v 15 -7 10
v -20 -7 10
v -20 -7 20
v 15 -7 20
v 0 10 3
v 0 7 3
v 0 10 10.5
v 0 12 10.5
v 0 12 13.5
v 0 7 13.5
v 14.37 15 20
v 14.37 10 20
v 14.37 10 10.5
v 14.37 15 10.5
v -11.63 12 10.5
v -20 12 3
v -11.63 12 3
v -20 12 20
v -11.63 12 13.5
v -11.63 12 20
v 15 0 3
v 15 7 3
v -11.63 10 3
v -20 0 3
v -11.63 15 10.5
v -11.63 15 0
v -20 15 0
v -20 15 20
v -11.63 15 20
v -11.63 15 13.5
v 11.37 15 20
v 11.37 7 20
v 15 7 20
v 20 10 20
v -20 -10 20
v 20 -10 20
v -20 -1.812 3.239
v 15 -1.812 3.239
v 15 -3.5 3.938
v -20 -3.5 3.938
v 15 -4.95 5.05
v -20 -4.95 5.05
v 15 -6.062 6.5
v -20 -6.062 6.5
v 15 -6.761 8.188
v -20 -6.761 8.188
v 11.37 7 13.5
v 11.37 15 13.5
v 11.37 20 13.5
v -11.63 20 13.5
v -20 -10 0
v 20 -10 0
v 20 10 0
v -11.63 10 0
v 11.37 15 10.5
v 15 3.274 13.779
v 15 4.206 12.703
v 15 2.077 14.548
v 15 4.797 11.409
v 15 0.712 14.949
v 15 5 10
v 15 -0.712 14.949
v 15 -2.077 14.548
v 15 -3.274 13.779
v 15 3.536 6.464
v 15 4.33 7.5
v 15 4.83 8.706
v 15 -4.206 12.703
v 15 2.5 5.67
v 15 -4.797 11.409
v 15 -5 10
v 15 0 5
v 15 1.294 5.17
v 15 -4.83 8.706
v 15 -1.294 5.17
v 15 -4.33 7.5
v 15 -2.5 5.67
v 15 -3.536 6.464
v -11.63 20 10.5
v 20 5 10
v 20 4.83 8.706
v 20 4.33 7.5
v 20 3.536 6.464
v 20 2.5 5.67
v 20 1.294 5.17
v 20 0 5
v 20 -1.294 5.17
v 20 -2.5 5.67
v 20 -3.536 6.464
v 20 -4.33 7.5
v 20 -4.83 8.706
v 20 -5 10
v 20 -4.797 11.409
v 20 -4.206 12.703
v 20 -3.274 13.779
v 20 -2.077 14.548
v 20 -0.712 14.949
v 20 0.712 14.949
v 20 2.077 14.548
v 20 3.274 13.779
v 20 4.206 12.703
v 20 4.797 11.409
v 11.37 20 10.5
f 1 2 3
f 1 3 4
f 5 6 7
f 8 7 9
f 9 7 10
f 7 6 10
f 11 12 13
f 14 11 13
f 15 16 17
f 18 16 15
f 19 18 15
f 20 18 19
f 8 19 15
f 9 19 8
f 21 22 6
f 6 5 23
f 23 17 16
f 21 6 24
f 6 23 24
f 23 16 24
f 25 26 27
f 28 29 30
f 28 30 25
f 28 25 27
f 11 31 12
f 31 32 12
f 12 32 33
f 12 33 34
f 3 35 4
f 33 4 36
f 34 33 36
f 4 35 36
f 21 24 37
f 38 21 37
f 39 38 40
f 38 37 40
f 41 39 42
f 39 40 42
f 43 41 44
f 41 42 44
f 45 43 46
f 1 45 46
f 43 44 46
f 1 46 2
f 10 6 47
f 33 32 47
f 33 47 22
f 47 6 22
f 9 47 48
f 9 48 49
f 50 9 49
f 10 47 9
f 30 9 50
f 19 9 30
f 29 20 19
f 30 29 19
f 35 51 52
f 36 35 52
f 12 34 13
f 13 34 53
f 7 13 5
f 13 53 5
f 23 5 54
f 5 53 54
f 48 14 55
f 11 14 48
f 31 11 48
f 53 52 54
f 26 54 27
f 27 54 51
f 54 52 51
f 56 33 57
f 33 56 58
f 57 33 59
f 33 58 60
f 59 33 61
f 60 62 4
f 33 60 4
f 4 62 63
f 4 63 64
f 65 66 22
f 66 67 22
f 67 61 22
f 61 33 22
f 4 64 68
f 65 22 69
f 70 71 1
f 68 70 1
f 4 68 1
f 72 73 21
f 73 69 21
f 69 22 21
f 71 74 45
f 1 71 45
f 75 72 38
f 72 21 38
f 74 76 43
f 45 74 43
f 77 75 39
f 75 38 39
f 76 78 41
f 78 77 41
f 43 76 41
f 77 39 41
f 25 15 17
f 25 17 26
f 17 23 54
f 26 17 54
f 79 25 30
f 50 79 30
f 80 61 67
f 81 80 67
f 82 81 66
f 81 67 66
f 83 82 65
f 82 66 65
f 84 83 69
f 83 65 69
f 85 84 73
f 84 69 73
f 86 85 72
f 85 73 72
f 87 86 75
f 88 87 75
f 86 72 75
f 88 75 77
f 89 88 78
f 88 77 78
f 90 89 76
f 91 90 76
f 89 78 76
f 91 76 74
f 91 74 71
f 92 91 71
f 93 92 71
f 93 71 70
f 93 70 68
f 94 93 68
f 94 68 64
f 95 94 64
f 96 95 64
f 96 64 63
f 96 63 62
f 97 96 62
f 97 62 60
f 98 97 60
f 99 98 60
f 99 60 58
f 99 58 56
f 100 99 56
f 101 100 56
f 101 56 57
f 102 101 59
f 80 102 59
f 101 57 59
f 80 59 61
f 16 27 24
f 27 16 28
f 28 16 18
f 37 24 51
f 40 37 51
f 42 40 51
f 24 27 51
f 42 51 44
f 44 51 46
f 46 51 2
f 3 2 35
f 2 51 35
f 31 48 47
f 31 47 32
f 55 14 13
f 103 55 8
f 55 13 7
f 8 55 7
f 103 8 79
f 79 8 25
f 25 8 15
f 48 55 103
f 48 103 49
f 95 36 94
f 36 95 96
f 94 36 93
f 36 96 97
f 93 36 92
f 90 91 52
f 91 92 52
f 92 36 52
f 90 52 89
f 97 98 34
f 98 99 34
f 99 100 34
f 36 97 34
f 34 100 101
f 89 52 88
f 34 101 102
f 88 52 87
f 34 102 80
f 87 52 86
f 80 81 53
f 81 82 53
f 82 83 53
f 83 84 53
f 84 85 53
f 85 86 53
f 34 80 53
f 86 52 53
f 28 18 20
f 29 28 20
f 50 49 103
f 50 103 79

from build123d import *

# Parameters (mm, degrees)
F0_W      = 40
F0_H      = 20
F1_DEPTH  = 10
F3_W      = 35
F3_H      = 3
F4_DEPTH  = 10
F5_W      = 23
F5_H      = 3
F6_DEPTH  = 6.5
F7_W      = 23
F7_H      = 3
F8_DEPTH  = 5
F9_DEPTH  = 10
F10_DEPTH = 35
F11_DEPTH = 40
F12_DEPTH = 35
F13_DEPTH = 40
F14_DEPTH = 35
F15_W     = 20
F15_H     = 17
F16_DEPTH = 5


with BuildPart() as f1:
    # F0 (on Top) → F1 (new body)
    with BuildSketch(Plane.XY):
        Rectangle(F0_W, F0_H)
    extrude(amount=F1_DEPTH)

    # F3 (on face) → F4 (join)
    with BuildSketch(Plane.XY.offset(10)):
        Polygon((20, -10), (20, 10), (15, 10), (15, 7), (15, -7), (15, -10), align=None)
        with Locations((-2.5, 8.5)):
            Rectangle(F3_W, F3_H)
        with Locations((-2.5, -8.5)):
            Rectangle(F3_W, F3_H)
    extrude(amount=F4_DEPTH)

    # F5 (on face) → F6 (cut)
    with BuildSketch(Plane.XY.offset(20)):
        with Locations((-0.1296941414, 8.5)):
            Rectangle(F5_W, F5_H)
    extrude(amount=-F6_DEPTH, mode=Mode.SUBTRACT)

    # F7 (on face) → F8 (join)
    with BuildSketch(Plane(origin=(0, 10, 0), x_dir=(-1, 0, 0), z_dir=(0, 1, 0))):
        with Locations((0.1296941414, 12)):
            Rectangle(F7_W, F7_H)
        Polygon((-11.3703058586, 10.5), (-11.3703058586, 13.5), (-11.3703058586, 20), (-14.3703058586, 20), (-14.3703058586, 10.5), align=None)
        Polygon((11.6296941414, 20), (11.6296941414, 13.5), (11.6296941414, 10.5), (11.6296941414, 0), (20, 0), (20, 20), align=None)
    extrude(amount=F8_DEPTH)

    # F7 (on face) → F9 (join)
    with BuildSketch(Plane(origin=(0, 10, 0), x_dir=(-1, 0, 0), z_dir=(0, 1, 0))):
        with Locations((0.1296941414, 12)):
            Rectangle(F7_W, F7_H)
    extrude(amount=F9_DEPTH)

    # F2 (on face) → F10 (cut)
    with BuildSketch(Plane(origin=(-20, 0, 0), x_dir=(0, -1, 0), z_dir=(-1, 0, 0))):
        with BuildLine():
            Line((-5, 10), (-7, 10))
            ThreePointArc((-7, 10), (-4.9497474683, 5.0502525317), (0, 3))
            Line((0, 3), (0, 5))
            ThreePointArc((0, 5), (-3.5355339059, 6.4644660941), (-5, 10))
        make_face()
        with BuildLine():
            ThreePointArc((0, 5), (3.5355339059, 6.4644660941), (5, 10))
            Line((5, 10), (0, 10))
            Line((0, 10), (0, 5))
        make_face()
    extrude(amount=-F10_DEPTH, mode=Mode.SUBTRACT)

    # F2 (on face) → F11 (cut)
    with BuildSketch(Plane(origin=(-20, 0, 0), x_dir=(0, -1, 0), z_dir=(-1, 0, 0))):
        with BuildLine():
            Line((0, 10), (5, 10))
            ThreePointArc((5, 10), (0, 15), (-5, 10))
            Line((-5, 10), (0, 10))
        make_face()
        with BuildLine():
            ThreePointArc((0, 5), (3.5355339059, 6.4644660941), (5, 10))
            Line((5, 10), (0, 10))
            Line((0, 10), (0, 5))
        make_face()
        with BuildLine():
            Line((0, 10), (-5, 10))
            ThreePointArc((-5, 10), (-3.5355339059, 6.4644660941), (0, 5))
            Line((0, 5), (0, 10))
        make_face()
    extrude(amount=-F11_DEPTH, mode=Mode.SUBTRACT)

    # F2 (on face) → F12 (cut)
    with BuildSketch(Plane(origin=(-20, 0, 0), x_dir=(0, -1, 0), z_dir=(-1, 0, 0))):
        with BuildLine():
            Line((0, 10), (-5, 10))
            ThreePointArc((-5, 10), (-3.5355339059, 6.4644660941), (0, 5))
            Line((0, 5), (0, 10))
        make_face()
        with BuildLine():
            Line((-5, 10), (-7, 10))
            ThreePointArc((-7, 10), (-4.9497474683, 5.0502525317), (0, 3))
            Line((0, 3), (0, 5))
            ThreePointArc((0, 5), (-3.5355339059, 6.4644660941), (-5, 10))
        make_face()
        with BuildLine():
            ThreePointArc((0, 3), (-4.9497474683, 5.0502525317), (-7, 10))
            Line((-7, 10), (-7, 3))
            Line((-7, 3), (0, 3))
        make_face()
    extrude(amount=-F12_DEPTH, mode=Mode.SUBTRACT)

    # F2 (on face) → F13 (cut)
    with BuildSketch(Plane(origin=(-20, 0, 0), x_dir=(0, -1, 0), z_dir=(-1, 0, 0))):
        with BuildLine():
            Line((0, 10), (-5, 10))
            ThreePointArc((-5, 10), (-3.5355339059, 6.4644660941), (0, 5))
            Line((0, 5), (0, 10))
        make_face()
    extrude(amount=-F13_DEPTH, mode=Mode.SUBTRACT)

    # F2 (on face) → F14 (cut)
    with BuildSketch(Plane(origin=(-20, 0, 0), x_dir=(0, -1, 0), z_dir=(-1, 0, 0))):
        with BuildLine():
            ThreePointArc((0, 3), (4.9497474683, 5.0502525317), (7, 10))
            Line((7, 10), (5, 10))
            ThreePointArc((5, 10), (3.5355339059, 6.4644660941), (0, 5))
            Line((0, 5), (0, 3))
        make_face()
    extrude(amount=-F14_DEPTH, mode=Mode.SUBTRACT)

    # F15 (on face) → F16 (cut)
    with BuildSketch(Plane.XZ.offset(-7)):
        with Locations((-10, 11.5)):
            Rectangle(F15_W, F15_H)
    extrude(amount=-F16_DEPTH, mode=Mode.SUBTRACT)


solid = f1.part
